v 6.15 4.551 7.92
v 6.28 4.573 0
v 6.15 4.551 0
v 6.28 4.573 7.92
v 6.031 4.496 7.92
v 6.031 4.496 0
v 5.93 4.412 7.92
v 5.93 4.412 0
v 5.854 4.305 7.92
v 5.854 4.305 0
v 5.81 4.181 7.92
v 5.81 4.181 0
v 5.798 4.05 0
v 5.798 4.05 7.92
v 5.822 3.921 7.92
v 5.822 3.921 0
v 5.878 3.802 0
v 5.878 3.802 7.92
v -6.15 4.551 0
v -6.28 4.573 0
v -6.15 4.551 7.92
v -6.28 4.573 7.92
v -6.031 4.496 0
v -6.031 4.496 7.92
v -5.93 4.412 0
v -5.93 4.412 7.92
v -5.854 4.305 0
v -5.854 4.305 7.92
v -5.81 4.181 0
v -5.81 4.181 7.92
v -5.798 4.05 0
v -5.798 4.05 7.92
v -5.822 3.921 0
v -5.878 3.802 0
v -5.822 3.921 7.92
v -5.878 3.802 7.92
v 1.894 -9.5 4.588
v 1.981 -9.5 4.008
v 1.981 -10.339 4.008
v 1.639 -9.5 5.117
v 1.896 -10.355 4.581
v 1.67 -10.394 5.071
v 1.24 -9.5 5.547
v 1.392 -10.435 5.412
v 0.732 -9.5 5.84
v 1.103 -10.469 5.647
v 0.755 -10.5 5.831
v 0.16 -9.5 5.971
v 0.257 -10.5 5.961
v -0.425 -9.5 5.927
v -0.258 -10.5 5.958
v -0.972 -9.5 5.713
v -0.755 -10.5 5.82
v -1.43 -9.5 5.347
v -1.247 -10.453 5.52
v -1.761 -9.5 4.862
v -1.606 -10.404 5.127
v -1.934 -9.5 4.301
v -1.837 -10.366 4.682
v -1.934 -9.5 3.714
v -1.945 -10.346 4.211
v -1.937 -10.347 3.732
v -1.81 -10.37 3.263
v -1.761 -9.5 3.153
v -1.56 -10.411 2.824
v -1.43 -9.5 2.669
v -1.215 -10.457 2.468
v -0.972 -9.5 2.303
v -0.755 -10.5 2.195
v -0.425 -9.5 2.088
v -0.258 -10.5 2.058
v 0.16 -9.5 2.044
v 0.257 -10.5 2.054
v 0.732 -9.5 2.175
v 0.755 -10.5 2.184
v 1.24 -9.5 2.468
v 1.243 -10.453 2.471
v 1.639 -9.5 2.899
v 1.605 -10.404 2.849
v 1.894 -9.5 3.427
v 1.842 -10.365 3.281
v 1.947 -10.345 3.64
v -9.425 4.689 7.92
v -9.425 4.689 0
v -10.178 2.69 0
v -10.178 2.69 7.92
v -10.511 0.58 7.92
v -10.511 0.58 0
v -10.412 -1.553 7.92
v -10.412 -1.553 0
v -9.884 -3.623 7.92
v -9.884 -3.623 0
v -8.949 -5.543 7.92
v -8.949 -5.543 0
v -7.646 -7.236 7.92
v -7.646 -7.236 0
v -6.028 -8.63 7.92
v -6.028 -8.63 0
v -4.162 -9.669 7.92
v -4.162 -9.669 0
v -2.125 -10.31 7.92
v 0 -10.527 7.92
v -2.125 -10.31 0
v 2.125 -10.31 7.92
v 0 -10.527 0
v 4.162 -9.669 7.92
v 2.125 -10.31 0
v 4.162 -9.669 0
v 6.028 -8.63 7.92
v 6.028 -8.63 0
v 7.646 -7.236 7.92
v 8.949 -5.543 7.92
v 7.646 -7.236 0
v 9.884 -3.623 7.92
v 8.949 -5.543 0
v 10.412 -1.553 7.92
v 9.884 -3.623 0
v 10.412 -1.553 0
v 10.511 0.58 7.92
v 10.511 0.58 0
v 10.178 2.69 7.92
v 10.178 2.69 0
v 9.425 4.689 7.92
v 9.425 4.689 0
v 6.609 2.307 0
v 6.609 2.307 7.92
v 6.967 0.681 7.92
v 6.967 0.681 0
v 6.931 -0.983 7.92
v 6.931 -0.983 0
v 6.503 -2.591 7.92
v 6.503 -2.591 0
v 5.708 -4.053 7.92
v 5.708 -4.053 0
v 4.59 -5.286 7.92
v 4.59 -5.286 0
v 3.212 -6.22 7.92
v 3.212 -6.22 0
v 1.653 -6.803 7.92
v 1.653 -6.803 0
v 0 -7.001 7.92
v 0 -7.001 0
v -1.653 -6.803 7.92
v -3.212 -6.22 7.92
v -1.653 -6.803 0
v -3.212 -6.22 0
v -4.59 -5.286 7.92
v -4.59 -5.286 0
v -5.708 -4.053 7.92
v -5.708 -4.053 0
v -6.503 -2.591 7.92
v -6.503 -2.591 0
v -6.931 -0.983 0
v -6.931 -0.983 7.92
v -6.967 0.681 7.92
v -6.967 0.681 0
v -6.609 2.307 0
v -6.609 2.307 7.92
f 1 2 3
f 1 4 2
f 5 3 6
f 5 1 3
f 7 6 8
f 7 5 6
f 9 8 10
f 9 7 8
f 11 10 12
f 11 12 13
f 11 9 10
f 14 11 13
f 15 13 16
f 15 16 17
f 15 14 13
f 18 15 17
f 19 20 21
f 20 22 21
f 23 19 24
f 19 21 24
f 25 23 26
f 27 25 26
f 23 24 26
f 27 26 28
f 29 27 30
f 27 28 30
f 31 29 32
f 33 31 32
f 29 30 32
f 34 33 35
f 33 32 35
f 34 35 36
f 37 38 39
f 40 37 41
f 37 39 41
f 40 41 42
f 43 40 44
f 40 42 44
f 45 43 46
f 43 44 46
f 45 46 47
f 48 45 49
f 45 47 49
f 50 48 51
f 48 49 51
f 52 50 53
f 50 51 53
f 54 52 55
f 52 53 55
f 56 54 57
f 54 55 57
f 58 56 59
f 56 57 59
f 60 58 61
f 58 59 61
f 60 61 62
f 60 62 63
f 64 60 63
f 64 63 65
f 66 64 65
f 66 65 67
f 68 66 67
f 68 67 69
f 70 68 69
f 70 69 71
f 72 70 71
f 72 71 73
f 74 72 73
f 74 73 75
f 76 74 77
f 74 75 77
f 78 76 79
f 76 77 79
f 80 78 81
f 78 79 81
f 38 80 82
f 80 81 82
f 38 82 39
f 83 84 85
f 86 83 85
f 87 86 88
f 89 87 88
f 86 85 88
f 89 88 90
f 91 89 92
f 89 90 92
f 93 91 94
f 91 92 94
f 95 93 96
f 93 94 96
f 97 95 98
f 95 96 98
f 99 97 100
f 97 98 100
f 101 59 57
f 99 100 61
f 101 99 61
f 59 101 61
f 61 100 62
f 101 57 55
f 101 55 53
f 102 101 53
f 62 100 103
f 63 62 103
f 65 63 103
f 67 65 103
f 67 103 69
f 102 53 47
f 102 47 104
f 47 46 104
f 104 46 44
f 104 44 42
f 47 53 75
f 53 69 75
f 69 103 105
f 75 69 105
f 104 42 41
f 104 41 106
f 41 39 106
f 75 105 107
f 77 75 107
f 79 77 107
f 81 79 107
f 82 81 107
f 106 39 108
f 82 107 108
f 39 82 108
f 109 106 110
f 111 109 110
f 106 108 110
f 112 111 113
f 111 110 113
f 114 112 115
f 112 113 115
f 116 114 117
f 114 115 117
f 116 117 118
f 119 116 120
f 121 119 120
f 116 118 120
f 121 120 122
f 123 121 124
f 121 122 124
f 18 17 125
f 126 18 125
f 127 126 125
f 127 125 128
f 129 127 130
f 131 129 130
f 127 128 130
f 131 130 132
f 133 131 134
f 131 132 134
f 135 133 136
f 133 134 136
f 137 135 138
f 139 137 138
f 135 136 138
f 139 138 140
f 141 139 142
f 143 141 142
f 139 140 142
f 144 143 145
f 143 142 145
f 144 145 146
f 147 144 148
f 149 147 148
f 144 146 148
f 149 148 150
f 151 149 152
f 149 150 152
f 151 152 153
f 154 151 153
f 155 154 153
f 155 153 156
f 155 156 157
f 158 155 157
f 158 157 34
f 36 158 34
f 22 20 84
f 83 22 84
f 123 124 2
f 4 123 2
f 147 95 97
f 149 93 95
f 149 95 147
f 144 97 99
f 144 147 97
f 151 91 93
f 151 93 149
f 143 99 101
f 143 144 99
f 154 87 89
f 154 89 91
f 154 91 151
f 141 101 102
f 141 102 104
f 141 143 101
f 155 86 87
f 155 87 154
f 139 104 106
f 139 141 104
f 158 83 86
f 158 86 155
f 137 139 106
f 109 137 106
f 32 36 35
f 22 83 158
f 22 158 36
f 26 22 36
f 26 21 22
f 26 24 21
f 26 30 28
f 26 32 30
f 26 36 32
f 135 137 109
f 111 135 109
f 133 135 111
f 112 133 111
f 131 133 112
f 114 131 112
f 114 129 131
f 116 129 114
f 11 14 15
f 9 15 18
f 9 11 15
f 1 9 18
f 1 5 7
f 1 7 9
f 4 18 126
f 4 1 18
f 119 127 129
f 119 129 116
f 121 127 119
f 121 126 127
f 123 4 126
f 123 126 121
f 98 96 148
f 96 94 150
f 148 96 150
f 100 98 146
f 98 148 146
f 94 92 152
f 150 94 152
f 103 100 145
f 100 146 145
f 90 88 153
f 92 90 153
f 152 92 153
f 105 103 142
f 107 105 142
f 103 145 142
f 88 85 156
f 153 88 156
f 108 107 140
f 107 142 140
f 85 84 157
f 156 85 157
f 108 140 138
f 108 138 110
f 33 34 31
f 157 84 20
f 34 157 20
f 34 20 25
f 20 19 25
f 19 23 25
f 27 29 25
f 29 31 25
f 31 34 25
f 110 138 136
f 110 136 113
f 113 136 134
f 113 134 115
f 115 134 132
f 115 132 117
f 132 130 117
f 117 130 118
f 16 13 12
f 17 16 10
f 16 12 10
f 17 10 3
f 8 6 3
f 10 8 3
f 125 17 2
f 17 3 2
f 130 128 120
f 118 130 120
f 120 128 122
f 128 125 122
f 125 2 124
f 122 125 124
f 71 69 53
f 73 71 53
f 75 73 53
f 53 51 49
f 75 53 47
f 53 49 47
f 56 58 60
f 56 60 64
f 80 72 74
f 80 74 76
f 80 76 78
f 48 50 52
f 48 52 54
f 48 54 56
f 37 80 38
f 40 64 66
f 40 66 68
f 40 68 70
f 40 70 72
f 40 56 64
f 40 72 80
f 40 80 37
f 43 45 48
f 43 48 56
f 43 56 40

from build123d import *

# Parameters (mm, degrees)
F2_DEPTH = 7.92
F3_R     = 0.5
F5_R     = 1.968691
F6_DEPTH = 1


with BuildPart() as f2:
    # F1 (on Top) → F2 (new body)
    with BuildSketch(Plane.XY):
        with BuildLine():
            Line((-5.330044, 4.538535), (-9.425229, 4.688782))
            ThreePointArc((-9.425229, 4.688782), (0, -10.527089), (9.425229, 4.688782))
            Line((9.425229, 4.688782), (5.330044, 4.538535))
            ThreePointArc((5.330044, 4.538535), (0, -7.000548), (-5.330044, 4.538535))
        make_face()
    extrude(amount=F2_DEPTH)

    # F3
    f3_edges = [f2.edges().sort_by_distance(p)[0] for p in [
        (-5.330044, 4.538535, 3.96),
        (5.330044, 4.538535, 3.96),
    ]]
    fillet(f3_edges, radius=F3_R)

    # F5 (on offset) → F6 (cut)
    with BuildSketch(Plane.XZ.offset(10.5)):
        with Locations((0.012802, 4.007582)):
            Circle(F5_R)
    extrude(amount=-F6_DEPTH, mode=Mode.SUBTRACT)


solid = f2.part
